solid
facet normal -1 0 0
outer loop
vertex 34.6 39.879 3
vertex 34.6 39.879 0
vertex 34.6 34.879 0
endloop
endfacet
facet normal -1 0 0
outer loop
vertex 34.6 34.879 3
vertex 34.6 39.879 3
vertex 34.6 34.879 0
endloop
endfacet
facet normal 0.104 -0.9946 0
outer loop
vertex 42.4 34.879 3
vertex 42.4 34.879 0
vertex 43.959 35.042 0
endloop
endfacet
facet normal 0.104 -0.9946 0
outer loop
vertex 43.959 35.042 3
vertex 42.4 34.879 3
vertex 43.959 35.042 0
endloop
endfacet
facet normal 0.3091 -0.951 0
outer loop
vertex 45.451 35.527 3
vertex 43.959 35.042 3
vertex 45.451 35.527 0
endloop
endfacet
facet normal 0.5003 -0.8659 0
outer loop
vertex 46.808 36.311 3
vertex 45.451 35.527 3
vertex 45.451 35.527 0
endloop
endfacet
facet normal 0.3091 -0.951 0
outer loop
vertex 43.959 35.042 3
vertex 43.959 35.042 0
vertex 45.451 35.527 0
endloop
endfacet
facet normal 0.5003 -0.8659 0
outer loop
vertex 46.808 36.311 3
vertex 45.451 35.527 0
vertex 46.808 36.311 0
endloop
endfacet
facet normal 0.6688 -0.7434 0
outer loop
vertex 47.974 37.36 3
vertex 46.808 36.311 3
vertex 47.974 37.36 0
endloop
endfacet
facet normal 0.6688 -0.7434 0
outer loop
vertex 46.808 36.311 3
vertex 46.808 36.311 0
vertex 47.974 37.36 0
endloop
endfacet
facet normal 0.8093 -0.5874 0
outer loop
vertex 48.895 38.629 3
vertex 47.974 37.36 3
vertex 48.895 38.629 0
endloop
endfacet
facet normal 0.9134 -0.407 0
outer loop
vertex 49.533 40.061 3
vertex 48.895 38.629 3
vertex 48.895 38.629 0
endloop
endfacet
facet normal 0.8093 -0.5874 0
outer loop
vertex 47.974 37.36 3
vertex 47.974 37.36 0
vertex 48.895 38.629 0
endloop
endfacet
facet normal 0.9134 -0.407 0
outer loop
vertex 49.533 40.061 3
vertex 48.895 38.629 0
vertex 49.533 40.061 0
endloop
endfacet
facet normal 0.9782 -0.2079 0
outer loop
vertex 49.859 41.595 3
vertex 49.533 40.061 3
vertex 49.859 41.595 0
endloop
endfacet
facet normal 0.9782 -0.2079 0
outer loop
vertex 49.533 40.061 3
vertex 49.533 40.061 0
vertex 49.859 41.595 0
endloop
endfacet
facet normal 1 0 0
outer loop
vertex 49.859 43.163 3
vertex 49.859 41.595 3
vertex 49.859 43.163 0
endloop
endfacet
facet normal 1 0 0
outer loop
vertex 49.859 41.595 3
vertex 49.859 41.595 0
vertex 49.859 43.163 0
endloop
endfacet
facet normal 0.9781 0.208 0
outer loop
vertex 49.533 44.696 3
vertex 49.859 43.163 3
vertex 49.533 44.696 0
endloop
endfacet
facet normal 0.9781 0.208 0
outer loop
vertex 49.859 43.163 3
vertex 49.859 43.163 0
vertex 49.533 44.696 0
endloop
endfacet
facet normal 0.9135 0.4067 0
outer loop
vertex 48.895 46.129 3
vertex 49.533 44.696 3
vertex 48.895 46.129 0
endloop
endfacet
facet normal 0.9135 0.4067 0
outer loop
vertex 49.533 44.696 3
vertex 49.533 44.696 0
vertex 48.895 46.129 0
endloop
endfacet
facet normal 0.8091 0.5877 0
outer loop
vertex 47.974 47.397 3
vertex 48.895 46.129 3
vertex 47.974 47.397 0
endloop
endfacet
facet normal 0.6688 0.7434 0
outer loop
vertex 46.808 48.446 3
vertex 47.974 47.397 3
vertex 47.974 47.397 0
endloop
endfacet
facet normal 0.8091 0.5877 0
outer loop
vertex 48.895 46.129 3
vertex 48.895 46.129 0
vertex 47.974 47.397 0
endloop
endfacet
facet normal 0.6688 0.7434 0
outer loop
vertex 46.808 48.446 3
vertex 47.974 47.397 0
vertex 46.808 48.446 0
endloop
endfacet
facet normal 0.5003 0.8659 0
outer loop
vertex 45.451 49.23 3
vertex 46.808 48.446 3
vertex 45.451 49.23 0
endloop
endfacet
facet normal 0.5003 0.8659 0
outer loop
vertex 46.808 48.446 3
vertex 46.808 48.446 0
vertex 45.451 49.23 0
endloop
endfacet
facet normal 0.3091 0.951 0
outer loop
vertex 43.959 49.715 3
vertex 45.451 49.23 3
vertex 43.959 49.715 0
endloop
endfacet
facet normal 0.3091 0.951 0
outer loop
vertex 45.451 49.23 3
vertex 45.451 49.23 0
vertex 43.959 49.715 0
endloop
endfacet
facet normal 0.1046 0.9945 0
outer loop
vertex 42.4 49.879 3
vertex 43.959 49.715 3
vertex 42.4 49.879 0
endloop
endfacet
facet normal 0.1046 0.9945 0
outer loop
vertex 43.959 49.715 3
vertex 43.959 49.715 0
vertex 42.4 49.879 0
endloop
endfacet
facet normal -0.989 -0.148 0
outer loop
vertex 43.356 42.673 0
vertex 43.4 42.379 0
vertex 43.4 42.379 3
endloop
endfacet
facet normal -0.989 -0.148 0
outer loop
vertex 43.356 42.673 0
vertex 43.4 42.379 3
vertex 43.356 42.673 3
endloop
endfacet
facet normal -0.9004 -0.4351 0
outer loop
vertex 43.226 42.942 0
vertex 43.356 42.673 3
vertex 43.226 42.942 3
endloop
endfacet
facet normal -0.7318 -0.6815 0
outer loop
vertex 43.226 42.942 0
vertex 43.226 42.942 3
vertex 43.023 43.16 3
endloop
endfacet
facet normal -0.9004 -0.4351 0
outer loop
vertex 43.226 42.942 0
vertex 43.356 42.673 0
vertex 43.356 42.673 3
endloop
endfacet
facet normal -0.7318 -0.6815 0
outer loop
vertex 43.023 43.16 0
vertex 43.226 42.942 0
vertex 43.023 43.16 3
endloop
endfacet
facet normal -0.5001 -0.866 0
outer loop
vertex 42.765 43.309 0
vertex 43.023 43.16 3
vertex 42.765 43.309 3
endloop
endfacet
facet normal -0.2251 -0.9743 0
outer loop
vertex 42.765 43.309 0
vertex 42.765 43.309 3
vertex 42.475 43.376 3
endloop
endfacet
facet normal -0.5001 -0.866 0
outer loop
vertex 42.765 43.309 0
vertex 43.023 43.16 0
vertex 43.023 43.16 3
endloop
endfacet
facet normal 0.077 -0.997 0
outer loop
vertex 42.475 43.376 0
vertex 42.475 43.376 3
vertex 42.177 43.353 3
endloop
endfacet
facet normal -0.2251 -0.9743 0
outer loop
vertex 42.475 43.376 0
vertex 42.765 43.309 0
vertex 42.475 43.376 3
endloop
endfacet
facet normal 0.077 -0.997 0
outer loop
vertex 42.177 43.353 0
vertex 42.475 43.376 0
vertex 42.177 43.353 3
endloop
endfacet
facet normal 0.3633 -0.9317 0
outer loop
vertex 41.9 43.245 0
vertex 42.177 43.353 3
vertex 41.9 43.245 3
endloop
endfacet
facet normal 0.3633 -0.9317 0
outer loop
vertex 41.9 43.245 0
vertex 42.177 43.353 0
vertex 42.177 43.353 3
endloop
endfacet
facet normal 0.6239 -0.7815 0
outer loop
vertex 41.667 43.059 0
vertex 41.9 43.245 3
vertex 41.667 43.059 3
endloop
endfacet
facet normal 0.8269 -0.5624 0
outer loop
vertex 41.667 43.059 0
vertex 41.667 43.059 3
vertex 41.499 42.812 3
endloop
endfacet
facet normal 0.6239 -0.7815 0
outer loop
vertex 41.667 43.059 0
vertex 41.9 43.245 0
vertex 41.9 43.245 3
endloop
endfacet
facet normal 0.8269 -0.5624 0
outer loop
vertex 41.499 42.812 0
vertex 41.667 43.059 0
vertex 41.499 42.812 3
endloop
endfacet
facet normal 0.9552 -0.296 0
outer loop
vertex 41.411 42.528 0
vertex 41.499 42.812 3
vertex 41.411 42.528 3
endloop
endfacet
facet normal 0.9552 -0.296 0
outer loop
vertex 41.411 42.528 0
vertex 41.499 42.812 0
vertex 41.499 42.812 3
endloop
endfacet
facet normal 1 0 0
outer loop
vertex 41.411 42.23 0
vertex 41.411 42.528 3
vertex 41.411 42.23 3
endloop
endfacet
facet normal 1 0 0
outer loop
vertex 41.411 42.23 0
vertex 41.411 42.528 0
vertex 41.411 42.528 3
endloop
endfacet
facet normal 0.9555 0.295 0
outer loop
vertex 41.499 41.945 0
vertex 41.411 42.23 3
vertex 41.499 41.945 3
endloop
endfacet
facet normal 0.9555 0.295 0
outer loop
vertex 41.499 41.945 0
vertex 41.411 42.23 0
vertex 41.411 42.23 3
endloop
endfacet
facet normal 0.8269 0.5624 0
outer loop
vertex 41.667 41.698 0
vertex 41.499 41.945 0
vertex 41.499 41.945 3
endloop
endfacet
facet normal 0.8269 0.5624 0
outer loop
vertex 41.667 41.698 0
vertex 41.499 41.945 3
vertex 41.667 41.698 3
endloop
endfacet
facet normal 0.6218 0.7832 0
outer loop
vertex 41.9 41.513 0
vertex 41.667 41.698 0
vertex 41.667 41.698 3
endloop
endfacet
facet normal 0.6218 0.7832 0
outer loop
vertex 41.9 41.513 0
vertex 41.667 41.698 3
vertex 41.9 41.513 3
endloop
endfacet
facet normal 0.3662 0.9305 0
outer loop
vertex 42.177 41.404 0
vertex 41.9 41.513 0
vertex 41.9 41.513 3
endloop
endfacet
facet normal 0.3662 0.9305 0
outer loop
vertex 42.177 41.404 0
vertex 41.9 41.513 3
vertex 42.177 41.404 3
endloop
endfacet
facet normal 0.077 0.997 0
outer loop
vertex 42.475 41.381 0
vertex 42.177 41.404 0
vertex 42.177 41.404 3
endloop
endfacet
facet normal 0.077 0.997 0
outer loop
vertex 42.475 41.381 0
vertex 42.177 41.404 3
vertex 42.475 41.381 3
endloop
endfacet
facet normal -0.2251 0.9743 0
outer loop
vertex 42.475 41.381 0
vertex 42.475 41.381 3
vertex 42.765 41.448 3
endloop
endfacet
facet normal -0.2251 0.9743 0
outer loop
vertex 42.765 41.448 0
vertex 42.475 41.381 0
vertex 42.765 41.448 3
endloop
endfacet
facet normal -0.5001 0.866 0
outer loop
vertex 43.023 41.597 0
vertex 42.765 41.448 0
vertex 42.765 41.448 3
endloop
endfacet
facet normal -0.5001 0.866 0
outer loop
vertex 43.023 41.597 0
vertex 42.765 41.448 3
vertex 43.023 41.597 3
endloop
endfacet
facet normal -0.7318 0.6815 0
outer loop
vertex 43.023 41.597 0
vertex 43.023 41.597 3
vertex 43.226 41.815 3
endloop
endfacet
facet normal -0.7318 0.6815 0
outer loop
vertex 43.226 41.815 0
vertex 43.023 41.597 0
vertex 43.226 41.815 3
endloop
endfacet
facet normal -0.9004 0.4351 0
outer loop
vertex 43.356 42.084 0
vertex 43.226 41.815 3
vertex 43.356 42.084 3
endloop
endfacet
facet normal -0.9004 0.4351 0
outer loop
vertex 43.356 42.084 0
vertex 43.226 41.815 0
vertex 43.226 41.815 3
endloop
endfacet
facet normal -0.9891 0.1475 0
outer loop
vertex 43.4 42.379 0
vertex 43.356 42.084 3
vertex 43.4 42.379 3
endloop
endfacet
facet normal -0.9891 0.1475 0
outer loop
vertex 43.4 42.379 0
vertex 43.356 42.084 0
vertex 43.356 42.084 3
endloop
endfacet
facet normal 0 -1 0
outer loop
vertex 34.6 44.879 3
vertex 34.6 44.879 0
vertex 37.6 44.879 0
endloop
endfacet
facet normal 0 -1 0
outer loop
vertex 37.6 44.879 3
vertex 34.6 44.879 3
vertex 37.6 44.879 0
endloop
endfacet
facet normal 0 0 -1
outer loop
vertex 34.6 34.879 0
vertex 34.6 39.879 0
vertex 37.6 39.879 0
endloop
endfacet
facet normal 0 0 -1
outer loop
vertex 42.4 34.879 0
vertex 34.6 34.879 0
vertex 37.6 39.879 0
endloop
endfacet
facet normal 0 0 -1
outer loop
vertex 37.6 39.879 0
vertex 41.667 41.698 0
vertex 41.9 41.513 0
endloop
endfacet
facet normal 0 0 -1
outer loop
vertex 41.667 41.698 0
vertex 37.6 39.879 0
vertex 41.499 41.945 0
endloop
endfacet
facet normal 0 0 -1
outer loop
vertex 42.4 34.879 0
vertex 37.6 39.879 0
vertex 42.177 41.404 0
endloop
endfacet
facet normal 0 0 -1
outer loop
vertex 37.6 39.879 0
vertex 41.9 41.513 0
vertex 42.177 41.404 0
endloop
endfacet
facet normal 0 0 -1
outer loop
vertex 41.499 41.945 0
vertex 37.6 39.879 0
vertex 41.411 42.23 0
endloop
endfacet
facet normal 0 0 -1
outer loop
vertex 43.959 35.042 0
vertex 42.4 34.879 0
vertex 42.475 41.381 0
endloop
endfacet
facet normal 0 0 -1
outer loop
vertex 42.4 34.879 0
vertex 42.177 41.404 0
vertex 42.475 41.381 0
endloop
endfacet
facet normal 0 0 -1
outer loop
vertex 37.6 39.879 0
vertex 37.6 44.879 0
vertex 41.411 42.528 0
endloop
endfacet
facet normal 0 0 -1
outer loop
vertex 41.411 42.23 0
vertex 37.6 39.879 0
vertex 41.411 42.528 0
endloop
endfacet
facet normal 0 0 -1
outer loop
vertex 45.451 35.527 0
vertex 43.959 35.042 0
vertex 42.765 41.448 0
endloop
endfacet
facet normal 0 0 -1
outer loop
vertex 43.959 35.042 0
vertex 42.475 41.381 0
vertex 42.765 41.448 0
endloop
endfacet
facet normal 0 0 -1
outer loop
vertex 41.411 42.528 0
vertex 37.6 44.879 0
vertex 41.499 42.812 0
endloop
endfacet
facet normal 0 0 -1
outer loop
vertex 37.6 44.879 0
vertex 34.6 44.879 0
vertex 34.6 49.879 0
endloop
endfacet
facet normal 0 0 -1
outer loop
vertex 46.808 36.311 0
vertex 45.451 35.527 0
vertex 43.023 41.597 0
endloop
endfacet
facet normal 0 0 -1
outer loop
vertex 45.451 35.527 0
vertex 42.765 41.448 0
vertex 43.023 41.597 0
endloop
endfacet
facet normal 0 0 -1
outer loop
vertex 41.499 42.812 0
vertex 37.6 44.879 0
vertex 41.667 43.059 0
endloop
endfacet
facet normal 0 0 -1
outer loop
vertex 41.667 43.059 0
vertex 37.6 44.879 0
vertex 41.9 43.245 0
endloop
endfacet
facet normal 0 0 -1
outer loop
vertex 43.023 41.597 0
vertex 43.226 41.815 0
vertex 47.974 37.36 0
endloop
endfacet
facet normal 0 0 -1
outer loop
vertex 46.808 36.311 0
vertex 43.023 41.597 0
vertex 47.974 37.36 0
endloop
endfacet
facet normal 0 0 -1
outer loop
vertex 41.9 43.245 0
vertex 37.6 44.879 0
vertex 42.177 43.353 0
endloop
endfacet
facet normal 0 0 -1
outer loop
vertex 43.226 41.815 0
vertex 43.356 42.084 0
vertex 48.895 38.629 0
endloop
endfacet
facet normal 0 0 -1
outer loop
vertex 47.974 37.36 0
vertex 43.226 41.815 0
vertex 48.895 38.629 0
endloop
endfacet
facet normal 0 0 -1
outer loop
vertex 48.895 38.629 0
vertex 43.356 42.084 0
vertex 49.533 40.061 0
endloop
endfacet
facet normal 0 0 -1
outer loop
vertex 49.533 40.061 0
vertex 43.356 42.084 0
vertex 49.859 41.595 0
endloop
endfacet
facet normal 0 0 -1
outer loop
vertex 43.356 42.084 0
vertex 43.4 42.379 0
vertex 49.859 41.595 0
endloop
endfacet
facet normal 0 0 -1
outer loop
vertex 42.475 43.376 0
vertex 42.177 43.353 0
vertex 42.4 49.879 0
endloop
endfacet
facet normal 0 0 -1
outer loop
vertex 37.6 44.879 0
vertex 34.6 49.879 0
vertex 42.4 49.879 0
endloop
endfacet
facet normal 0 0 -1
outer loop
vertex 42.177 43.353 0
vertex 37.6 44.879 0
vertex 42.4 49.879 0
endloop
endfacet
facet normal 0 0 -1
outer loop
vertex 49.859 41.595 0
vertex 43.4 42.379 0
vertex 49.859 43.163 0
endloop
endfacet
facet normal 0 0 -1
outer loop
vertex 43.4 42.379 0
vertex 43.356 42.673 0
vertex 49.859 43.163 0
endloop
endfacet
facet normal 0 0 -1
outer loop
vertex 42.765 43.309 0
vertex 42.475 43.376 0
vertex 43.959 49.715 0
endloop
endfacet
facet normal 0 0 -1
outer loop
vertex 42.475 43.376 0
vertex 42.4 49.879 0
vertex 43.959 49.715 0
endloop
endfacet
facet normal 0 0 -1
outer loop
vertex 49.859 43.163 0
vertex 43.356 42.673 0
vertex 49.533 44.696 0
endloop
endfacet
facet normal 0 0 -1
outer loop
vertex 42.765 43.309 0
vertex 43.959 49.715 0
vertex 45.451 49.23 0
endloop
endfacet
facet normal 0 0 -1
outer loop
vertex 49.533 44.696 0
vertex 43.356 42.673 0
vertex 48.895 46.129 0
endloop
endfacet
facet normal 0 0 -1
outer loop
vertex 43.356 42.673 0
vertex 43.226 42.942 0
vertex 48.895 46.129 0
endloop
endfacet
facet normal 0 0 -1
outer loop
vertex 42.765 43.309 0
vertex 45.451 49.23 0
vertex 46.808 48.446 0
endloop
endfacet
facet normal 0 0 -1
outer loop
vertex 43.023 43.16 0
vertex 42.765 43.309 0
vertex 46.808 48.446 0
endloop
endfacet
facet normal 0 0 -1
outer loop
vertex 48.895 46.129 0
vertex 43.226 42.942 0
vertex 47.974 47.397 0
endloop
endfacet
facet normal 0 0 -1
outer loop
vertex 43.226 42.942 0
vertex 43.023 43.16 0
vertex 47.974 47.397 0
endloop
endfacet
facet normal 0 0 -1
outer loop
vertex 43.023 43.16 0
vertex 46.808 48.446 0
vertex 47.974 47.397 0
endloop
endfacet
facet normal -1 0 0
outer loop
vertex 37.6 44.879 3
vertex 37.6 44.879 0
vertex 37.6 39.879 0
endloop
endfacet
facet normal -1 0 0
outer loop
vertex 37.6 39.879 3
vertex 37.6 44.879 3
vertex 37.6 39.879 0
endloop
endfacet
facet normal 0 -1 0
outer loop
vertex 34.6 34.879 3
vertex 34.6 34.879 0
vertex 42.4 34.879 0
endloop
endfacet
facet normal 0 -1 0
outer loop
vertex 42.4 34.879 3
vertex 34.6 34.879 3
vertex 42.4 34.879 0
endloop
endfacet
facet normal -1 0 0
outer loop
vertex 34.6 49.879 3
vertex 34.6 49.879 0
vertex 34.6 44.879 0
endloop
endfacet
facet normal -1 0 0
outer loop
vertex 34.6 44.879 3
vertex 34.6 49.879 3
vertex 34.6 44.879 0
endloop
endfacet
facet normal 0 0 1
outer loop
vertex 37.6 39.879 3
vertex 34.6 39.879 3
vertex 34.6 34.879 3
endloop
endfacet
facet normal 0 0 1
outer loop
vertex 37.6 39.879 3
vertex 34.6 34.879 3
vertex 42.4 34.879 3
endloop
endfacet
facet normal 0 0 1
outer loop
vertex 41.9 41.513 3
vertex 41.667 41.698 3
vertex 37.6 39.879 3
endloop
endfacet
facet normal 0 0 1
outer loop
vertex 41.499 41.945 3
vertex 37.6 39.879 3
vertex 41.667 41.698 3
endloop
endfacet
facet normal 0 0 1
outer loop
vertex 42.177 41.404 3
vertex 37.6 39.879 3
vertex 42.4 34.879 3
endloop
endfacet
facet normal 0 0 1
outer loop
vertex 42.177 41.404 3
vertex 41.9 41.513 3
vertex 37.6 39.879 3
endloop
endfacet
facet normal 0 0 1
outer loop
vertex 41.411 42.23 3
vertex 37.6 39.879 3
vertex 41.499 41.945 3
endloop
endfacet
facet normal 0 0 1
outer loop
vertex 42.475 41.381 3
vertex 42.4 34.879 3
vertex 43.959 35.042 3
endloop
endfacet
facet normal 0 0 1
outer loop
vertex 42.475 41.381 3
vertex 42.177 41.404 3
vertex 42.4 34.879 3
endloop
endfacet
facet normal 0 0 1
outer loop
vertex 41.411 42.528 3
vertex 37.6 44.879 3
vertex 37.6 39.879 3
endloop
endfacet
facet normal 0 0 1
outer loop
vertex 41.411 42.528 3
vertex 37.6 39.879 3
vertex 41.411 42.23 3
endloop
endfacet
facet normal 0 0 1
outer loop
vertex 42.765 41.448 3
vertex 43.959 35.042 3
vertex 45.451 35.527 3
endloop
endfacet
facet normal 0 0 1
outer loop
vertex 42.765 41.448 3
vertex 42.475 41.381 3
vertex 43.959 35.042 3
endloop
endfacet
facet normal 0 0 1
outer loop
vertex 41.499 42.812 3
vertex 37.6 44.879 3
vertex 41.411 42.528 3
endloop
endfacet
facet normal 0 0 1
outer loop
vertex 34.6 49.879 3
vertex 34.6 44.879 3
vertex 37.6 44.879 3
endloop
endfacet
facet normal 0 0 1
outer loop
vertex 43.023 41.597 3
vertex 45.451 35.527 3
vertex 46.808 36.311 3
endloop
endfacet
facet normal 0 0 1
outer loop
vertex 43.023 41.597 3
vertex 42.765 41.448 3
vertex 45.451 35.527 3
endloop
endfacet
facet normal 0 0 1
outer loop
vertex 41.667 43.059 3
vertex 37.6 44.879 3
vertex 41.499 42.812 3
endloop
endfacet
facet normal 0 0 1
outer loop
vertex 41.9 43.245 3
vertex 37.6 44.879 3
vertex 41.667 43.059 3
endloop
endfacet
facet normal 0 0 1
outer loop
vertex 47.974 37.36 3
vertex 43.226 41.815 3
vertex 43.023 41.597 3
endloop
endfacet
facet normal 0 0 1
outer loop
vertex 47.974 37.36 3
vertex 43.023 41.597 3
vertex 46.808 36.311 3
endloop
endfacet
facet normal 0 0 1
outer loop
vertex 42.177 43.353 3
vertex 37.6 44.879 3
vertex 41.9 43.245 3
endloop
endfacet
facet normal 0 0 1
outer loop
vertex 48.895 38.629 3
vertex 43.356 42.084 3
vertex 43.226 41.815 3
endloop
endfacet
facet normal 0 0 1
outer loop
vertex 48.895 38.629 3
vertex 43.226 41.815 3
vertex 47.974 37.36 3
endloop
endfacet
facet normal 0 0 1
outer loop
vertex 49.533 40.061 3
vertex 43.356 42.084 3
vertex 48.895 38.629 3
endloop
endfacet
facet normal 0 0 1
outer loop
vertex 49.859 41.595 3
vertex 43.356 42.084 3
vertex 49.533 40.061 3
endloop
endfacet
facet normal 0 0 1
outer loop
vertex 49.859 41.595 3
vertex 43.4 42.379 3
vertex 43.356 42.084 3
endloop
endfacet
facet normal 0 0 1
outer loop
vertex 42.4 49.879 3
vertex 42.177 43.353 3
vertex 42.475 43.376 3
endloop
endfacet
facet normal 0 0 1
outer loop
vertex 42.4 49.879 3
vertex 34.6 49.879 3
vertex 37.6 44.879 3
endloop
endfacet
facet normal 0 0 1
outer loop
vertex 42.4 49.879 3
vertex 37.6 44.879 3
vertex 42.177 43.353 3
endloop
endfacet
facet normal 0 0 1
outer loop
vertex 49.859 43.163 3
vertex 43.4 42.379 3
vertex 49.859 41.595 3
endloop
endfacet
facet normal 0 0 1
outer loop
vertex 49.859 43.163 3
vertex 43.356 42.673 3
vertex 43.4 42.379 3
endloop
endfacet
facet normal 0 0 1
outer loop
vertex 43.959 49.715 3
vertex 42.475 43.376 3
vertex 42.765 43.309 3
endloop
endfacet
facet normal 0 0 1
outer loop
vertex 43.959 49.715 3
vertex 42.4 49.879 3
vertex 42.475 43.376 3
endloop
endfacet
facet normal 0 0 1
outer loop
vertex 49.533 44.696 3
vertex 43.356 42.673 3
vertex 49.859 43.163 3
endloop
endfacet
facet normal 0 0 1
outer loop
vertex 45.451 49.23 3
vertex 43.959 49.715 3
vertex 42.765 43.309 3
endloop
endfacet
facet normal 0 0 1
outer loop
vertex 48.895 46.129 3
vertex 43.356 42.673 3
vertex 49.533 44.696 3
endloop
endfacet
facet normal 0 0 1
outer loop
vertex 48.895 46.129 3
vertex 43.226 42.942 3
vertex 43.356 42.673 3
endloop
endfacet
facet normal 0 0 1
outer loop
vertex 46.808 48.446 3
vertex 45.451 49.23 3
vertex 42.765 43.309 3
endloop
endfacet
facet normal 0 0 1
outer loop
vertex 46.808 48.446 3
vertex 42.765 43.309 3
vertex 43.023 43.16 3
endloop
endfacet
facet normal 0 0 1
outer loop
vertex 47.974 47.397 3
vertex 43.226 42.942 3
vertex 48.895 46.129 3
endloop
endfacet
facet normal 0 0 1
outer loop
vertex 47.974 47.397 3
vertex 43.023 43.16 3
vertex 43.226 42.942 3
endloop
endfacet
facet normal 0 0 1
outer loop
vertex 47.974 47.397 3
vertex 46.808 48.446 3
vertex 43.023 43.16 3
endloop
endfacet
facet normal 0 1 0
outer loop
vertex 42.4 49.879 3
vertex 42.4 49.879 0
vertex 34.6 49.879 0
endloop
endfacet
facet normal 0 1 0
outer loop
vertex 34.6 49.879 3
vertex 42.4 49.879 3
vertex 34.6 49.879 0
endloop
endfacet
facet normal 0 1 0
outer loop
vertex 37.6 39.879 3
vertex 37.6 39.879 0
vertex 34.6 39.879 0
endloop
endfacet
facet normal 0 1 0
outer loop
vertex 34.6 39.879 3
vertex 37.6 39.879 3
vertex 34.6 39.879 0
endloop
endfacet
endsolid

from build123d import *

# Parameters (mm, degrees)
CORTE_EXTERIOR_R        = 1
SALIENTE_EXTRUIR1_DEPTH = 3


with BuildPart() as part:
    # Corte exterior → Saliente-Extruir1 (new body)
    with BuildSketch(Plane.XY):
        with BuildLine():
            Line((42.4, 49.878566683), (34.6, 49.878566683))
            Line((34.6, 49.878566683), (34.6, 44.878566683))
            Line((34.6, 44.878566683), (37.6, 44.878566683))
            Line((37.6, 44.878566683), (37.6, 39.878566683))
            Line((37.6, 39.878566683), (34.6, 39.878566683))
            Line((34.6, 39.878566683), (34.6, 34.878566683))
            Line((34.6, 34.878566683), (42.4, 34.878566683))
            ThreePointArc((42.4, 34.878566683), (49.9, 42.378566683), (42.4, 49.878566683))
        make_face()
        with Locations((42.4, 42.378566683)):
            Circle(CORTE_EXTERIOR_R, mode=Mode.SUBTRACT)
    extrude(amount=SALIENTE_EXTRUIR1_DEPTH)


solid = part.part
